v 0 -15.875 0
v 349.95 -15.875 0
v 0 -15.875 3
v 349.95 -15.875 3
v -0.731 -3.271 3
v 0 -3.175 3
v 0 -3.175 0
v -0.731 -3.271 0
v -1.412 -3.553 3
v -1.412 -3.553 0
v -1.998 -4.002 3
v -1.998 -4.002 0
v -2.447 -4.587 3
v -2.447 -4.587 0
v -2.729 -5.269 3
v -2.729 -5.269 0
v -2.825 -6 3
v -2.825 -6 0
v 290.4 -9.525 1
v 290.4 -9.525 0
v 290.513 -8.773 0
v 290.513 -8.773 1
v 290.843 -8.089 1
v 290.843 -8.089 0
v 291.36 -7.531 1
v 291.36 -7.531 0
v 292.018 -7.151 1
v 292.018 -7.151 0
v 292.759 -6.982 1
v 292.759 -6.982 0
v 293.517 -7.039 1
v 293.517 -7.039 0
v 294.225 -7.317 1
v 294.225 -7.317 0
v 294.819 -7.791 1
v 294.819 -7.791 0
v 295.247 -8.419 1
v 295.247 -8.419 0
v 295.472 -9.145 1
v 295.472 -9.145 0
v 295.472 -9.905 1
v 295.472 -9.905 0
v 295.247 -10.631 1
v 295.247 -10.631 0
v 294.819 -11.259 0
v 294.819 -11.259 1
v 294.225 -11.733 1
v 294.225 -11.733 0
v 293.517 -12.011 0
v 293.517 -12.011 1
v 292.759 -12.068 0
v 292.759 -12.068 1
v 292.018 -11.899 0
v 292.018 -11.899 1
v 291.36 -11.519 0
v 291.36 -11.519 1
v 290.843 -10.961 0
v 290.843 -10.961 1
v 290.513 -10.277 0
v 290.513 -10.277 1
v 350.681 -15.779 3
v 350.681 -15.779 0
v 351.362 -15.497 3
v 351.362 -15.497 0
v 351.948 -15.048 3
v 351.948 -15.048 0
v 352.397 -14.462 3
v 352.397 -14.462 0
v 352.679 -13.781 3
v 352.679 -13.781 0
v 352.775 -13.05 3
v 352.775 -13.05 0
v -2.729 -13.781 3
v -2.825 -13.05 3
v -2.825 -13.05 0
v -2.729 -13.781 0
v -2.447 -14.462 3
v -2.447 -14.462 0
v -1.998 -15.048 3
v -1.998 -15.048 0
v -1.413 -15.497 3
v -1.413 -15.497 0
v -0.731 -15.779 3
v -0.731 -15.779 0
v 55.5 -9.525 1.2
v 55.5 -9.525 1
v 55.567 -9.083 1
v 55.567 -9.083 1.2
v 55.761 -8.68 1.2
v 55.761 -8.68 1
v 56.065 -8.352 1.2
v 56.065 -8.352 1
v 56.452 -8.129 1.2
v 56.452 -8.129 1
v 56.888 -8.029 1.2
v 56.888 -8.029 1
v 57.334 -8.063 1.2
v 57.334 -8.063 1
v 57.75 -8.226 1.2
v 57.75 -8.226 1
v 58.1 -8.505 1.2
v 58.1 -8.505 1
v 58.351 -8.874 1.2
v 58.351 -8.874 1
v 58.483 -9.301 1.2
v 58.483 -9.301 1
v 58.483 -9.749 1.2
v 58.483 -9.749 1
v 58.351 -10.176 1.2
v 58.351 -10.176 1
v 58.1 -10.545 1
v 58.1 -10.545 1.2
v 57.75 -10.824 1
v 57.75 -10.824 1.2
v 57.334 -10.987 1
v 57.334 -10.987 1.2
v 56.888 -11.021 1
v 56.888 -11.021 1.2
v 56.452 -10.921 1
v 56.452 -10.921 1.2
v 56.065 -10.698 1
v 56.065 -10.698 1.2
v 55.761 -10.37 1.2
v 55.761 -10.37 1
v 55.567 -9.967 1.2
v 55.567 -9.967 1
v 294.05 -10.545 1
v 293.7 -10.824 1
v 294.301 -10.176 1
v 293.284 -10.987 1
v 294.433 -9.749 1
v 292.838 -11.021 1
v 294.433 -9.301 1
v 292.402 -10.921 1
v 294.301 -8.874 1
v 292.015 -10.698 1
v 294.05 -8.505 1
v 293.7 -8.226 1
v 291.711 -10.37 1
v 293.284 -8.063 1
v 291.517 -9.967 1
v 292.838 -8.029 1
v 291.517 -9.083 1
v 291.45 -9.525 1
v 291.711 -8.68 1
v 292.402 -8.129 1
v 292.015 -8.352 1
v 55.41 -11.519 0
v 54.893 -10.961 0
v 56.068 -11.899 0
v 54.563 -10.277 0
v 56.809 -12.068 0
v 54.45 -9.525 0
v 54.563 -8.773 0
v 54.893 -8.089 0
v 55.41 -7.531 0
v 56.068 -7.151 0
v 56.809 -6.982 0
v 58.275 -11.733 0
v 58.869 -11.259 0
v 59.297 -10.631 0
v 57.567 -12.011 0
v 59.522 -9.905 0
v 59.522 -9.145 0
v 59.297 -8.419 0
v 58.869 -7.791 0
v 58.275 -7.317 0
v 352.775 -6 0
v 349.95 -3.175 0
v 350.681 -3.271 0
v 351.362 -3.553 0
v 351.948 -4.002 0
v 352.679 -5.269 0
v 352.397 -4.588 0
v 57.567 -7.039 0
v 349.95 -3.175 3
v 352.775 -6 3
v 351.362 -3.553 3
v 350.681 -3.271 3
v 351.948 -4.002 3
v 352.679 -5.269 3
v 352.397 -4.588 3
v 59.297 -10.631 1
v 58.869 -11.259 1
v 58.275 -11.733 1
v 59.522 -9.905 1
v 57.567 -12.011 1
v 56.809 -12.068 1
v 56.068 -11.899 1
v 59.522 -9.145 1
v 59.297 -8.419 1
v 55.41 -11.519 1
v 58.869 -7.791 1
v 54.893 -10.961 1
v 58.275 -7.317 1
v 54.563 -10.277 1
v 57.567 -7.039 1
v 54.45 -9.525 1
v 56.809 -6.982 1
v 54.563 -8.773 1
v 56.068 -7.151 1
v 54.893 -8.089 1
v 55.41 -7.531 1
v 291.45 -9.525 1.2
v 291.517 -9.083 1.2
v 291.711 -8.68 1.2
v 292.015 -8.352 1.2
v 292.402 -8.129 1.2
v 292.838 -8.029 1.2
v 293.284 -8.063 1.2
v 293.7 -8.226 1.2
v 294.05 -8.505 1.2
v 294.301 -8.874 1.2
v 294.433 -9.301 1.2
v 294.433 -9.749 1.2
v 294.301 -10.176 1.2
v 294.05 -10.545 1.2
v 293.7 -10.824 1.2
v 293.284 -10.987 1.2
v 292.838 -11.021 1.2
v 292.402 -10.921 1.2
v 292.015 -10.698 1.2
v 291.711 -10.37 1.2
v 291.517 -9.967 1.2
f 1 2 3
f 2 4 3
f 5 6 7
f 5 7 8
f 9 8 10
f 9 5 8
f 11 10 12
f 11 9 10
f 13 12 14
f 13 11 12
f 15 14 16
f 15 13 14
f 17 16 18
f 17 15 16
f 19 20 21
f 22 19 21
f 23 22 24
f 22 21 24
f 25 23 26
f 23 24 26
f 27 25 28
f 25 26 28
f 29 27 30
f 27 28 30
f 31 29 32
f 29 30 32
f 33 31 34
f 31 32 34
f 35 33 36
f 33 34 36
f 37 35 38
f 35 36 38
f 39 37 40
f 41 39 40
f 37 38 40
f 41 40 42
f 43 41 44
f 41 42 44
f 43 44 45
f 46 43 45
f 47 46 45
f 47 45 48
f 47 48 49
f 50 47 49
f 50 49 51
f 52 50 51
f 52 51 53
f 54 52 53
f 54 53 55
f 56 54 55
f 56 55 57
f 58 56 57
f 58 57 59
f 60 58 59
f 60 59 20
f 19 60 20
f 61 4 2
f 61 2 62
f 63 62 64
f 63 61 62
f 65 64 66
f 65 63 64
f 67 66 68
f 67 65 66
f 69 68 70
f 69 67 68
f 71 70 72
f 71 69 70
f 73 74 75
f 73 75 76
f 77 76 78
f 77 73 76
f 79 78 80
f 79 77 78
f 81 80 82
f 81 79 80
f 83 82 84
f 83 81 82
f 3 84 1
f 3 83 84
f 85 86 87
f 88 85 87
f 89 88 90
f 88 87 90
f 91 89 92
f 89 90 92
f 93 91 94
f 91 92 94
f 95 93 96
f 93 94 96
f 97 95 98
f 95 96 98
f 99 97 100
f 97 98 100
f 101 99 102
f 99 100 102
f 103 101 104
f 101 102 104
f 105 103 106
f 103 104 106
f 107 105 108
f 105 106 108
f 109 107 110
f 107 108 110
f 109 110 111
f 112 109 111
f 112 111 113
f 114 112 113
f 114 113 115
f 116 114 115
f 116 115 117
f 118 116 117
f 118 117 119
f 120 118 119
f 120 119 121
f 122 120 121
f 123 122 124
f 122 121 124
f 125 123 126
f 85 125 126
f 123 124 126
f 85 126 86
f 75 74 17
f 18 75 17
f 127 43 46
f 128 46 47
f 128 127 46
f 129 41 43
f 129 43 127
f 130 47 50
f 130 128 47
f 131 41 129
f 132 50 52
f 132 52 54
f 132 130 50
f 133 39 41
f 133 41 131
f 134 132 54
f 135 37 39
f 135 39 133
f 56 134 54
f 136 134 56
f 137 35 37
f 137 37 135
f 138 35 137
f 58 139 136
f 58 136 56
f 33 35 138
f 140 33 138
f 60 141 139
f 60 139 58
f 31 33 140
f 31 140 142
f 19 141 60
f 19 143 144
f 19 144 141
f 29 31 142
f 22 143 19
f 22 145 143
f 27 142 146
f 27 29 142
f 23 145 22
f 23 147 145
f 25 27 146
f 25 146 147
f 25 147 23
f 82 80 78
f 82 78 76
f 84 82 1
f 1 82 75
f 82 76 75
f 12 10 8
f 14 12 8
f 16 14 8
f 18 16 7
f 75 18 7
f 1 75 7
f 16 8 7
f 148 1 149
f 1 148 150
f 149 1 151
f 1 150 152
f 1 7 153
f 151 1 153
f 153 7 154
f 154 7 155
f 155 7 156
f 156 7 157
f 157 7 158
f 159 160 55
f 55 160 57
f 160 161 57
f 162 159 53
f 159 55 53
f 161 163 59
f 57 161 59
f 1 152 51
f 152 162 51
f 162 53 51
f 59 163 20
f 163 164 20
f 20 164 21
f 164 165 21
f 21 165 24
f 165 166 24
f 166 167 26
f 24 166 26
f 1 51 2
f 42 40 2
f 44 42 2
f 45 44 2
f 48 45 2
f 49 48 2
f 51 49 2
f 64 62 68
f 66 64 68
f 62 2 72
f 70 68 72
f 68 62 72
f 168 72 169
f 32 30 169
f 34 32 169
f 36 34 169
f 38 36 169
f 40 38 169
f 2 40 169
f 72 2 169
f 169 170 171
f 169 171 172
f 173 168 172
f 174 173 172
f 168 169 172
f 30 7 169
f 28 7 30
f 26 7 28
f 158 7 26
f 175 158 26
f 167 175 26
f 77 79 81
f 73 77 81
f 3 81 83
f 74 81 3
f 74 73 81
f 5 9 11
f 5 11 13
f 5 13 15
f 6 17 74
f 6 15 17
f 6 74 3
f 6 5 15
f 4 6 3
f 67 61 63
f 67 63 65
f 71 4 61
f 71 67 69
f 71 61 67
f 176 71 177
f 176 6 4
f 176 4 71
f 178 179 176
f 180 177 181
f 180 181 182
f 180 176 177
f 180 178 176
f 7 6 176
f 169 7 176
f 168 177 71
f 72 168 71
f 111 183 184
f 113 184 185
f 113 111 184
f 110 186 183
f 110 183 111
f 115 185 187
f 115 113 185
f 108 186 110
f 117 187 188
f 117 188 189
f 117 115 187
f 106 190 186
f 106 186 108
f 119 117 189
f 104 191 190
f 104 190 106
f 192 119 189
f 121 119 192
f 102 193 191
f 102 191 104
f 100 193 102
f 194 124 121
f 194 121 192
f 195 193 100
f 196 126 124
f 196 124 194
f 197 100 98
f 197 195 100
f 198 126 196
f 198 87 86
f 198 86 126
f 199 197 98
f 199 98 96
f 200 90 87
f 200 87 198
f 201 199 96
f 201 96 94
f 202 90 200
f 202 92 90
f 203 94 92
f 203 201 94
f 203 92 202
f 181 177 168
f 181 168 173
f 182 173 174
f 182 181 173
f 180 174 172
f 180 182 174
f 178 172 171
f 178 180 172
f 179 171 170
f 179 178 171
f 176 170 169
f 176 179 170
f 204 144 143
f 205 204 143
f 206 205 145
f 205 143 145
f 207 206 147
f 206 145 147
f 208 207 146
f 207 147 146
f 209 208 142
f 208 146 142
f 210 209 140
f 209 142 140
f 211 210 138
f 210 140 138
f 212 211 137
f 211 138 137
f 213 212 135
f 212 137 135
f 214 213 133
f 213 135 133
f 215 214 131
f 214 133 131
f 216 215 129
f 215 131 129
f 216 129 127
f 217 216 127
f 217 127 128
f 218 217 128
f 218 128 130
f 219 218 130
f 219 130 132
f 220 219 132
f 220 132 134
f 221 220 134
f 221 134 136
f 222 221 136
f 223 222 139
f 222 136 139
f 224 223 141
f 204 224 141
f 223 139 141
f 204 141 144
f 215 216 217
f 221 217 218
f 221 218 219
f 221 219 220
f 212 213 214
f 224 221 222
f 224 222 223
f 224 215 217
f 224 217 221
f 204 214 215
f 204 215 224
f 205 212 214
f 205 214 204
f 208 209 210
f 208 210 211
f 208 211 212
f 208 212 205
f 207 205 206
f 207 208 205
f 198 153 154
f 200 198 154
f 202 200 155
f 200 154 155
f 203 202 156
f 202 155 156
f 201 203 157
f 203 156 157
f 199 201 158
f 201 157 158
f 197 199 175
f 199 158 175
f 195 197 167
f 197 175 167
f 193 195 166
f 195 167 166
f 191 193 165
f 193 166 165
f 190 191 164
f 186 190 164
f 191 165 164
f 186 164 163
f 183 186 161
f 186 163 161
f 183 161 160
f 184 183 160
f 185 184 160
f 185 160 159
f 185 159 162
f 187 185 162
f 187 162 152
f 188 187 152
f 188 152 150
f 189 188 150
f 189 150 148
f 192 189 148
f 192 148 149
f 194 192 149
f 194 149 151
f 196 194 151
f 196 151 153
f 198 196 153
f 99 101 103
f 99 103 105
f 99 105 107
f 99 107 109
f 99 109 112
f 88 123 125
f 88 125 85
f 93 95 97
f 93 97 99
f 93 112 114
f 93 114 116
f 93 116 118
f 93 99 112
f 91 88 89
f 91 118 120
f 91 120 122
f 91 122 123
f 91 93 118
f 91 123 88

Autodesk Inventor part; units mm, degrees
ref_plane "YZ Plane" through (0, 0, 0) normal (1, 0, 0) x (0, 1, 0)
ref_plane "XZ Plane" through (0, 0, 0) normal (0, 1, 0) x (-1, 0, 0)
ref_plane "XY Plane" through (0, 0, 0) normal (0, 0, 1) x (1, 0, 0)
sketch "Sketch1" plane through (0, 0, 0) normal (0, 0, 1) x (1, 0, 0)
  line L0 (0, -3) -> (349.95, -3)
  line L1 (352.95, -6) -> (352.95, -13.05)
  line L2 (349.95, -16.05) -> (0, -16.05)
  line L3 (-3, -13.05) -> (-3, -6)
  arc A0 (352.95, -6) -> (349.95, -3) centre (349.95, -6) ccw
  arc A1 (349.95, -16.05) -> (352.95, -13.05) centre (349.95, -13.05) ccw
  arc A2 (0, -3) -> (-3, -6) centre (0, -6) ccw
  arc A3 (-3, -13.05) -> (0, -16.05) centre (0, -13.05) ccw
  point P0 (0, 0)
  point P1 (-6, -19.05)
  dimension "d0" = 3
extrude "Extrusion1" add sketch "Sketch1" along normal blind 3
sketch "Sketch2" plane through (0, 0, 3) normal (0, 0, 1) x (1, 0, 0)
  line L0 (-3, -3) -> (352.95, -3)
  line L1 (352.95, -3) -> (352.95, -16.05)
  line L2 (352.95, -16.05) -> (-3, -16.05)
  line L3 (-3, -16.05) -> (-3, -3)
  line L4 (174.975, -9.525) -> (174.975, -13.6338)
  line L5 (33.6, -9.525) -> (316.35, -9.525) construction
  line L6 (33.6, -11.025) -> (316.35, -11.025)
  line L7 (316.35, -8.025) -> (33.6, -8.025)
  arc A0 (33.6, -8.025) -> (33.6, -11.025) centre (33.6, -9.525) ccw
  arc A1 (316.35, -11.025) -> (316.35, -8.025) centre (316.35, -9.525) ccw
  point P0 (0, 0)
  dimension "d4" = 3
sketch "Sketch3" plane through (0, 0, 0) normal (0, 0, -1) x (-1, 0, 0)
  line L0 (-352.95, -3) -> (3, -3)
  line L1 (3, -3) -> (3, -16.05)
  line L2 (3, -16.05) -> (-352.95, -16.05)
  line L3 (-352.95, -16.05) -> (-352.95, -3)
  line L4 (0, -16.05) -> (-349.95, -16.05)
  line L5 (-352.95, -3) -> (-322.95, -3)
  line L6 (-322.95, -3) -> (-322.95, -16.05)
  line L7 (-322.95, -16.05) -> (-352.95, -16.05)
  line L8 (-352.95, -16.05) -> (-352.95, -3)
  line L9 (3, -3) -> (-27, -3)
  line L10 (-27, -3) -> (-27, -16.05)
  line L11 (-27, -16.05) -> (3, -16.05)
  line L12 (3, -16.05) -> (3, -3)
  line L13 (-322.95, -3) -> (-322.95, -9.525)
  line L14 (-322.95, -9.525) -> (-27, -9.525)
  line L15 (-322.95, -9.525) -> (-292.95, -9.525)
  line L16 (-27, -9.525) -> (-57, -9.525)
  circle A0 centre (-292.95, -9.525) radius 2.5
  circle A1 centre (-57, -9.525) radius 2.5
  line L17 (-290.45, -9.525) -> (-285.45, -9.525)
  line L18 (-352.95, -3) -> (3, -3)
  line L19 (3, -3) -> (3, -16.05)
  line L20 (3, -16.05) -> (-352.95, -16.05)
  line L21 (-352.95, -16.05) -> (-352.95, -3)
  point P0 (0, 0)
  point P1 (-355.95, -19.05)
  dimension "d7" = 30
  dimension "d8" = 30
  dimension "d9" = 6.525
  dimension "d10" = 30
  dimension "d11" = 30
  dimension "d12" = 5
  dimension "d13" = 5
extrude "Extrusion3" cut sketch "Sketch3" against normal blind 1 contours A0 L14 | L14 A0 | A1 L14 | L14 A1
sketch "Sketch4" plane through (57, -9.525, 1) normal (0, 0, -1) x (-1, 0, 0)
  circle A0 centre (0, 0) radius 2.5
  circle A1 centre (-235.95, 0) radius 2.5 projected
  circle A2 centre (-235.95, 0) radius 2.5
  circle A3 centre (-235.95, 0) radius 1.5
  circle A4 centre (0, 0) radius 1.5
  point P0 (57, 9.525)
  dimension "d16" = 1
  dimension "d17" = 1
extrude "Extrusion4" cut sketch "Sketch4" against normal blind 0.2 contours A3 | A4
sketch "Sketch5" plane through (0, 0, 3) normal (0, 0, 1) x (1, 0, 0)
  line L0 (352.95, -13.05) -> (352.95, -6) projected
  arc A0 (352.95, -6) -> (349.95, -3) centre (349.95, -6) ccw projected
  line L1 (349.95, -3) -> (0, -3) projected
  arc A1 (0, -3) -> (-3, -6) centre (0, -6) ccw projected
  line L2 (-3, -6) -> (-3, -13.05) projected
  arc A2 (-3, -13.05) -> (0, -16.05) centre (0, -13.05) ccw projected
  line L3 (0, -16.05) -> (349.95, -16.05) projected
  arc A3 (349.95, -16.05) -> (352.95, -13.05) centre (349.95, -13.05) ccw projected
  line L4 (0, -2.975) -> (349.95, -2.975)
  arc A4 (352.975, -6) -> (349.95, -2.975) centre (349.95, -6) ccw
  line L5 (352.975, -6) -> (352.975, -13.05)
  arc A5 (349.95, -16.075) -> (352.975, -13.05) centre (349.95, -13.05) ccw
  line L6 (349.95, -16.075) -> (0, -16.075)
  arc A6 (-3.025, -13.05) -> (0, -16.075) centre (0, -13.05) ccw
  line L7 (-3.025, -13.05) -> (-3.025, -6)
  arc A7 (0, -2.975) -> (-3.025, -6) centre (0, -6) ccw
  point P0 (0, 0)
  dimension "d20" = 0.025
extrude "Extrusion5" add sketch "Sketch5" against normal up to surface (3 mm away)
sketch "Sketch6" plane through (0, 0, 3) normal (0, 0, 1) x (1, 0, 0)
  line L0 (352.975, -13.05) -> (352.975, -6) projected
  arc A0 (352.975, -6) -> (349.95, -2.975) centre (349.95, -6) ccw projected
  line L1 (349.95, -2.975) -> (0, -2.975) projected
  arc A1 (0, -2.975) -> (-3.025, -6) centre (0, -6) ccw projected
  line L2 (-3.025, -6) -> (-3.025, -13.05) projected
  arc A2 (-3.025, -13.05) -> (0, -16.075) centre (0, -13.05) ccw projected
  line L3 (0, -16.075) -> (349.95, -16.075) projected
  arc A3 (349.95, -16.075) -> (352.975, -13.05) centre (349.95, -13.05) ccw projected
  line L4 (0, -3.175) -> (349.95, -3.175)
  arc A4 (352.775, -6) -> (349.95, -3.175) centre (349.95, -6) ccw
  line L5 (352.775, -6) -> (352.775, -13.05)
  arc A5 (349.95, -15.875) -> (352.775, -13.05) centre (349.95, -13.05) ccw
  line L6 (349.95, -15.875) -> (0, -15.875)
  arc A6 (-2.825, -13.05) -> (0, -15.875) centre (0, -13.05) ccw
  line L7 (-2.825, -13.05) -> (-2.825, -6)
  arc A7 (0, -3.175) -> (-2.825, -6) centre (0, -6) ccw
  point P0 (0, 0)
  dimension "d23" = 0.2
extrude "Extrusion6" cut sketch "Sketch6" against normal blind 10
sketch "Sketch7" plane through (0, 0, 0) normal (0, 0, -1) x (-1, 0, 0)
  circle A0 centre (-57, -9.525) radius 1.5 projected
  circle A1 centre (-57, -9.525) radius 2.55
  circle A2 centre (-292.95, -9.525) radius 1.5 projected
  circle A3 centre (-292.95, -9.525) radius 2.55
  point P0 (0, 0)
  dimension "d26" = 5.1
  dimension "d27" = 5.1
extrude "Extrusion7" cut sketch "Sketch7" against normal up to surface (1 mm away)
properties part number "2021-01-008" material "Aluminum 6061"
